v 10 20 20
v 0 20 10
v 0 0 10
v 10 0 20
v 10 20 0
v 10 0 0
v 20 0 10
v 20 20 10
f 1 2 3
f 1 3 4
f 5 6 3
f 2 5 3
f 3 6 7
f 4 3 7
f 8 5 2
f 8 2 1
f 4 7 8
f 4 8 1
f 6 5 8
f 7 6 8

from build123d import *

# Parameters (mm, degrees)
SKETCH1_W           = 20
SKETCH1_H           = 20
BOSS_EXTRUDE1_DEPTH = 20
CUT_EXTRUDE1_DEPTH  = 20
CUT_EXTRUDE2_DEPTH  = 20
CUT_EXTRUDE3_DEPTH  = 20
CUT_EXTRUDE4_DEPTH  = 20


with BuildPart() as part:
    # Sketch1 → Boss-Extrude1 (new body)
    with BuildSketch(Plane.XY):
        with Locations((10, 10)):
            Rectangle(SKETCH1_W, SKETCH1_H)
    extrude(amount=BOSS_EXTRUDE1_DEPTH)

    # Sketch2 → Cut-Extrude1 (cut)
    with BuildSketch(Plane(origin=(0, 20, 0), x_dir=(1, 0, 0), z_dir=(0, 1, 0))):
        Polygon((20, 0), (10, 0), (20, -10), align=None)
    extrude(amount=-CUT_EXTRUDE1_DEPTH, mode=Mode.SUBTRACT)

    # Sketch3 → Cut-Extrude2 (cut)
    with BuildSketch(Plane(origin=(0, 20, 0), x_dir=(1, 0, 0), z_dir=(0, 1, 0))):
        Polygon((20, -20), (20, -10), (10, -20), align=None)
    extrude(amount=-CUT_EXTRUDE2_DEPTH, mode=Mode.SUBTRACT)

    # Sketch4 → Cut-Extrude3 (cut)
    with BuildSketch(Plane(origin=(0, 20, 0), x_dir=(1, 0, 0), z_dir=(0, 1, 0))):
        Polygon((0, 0), (10, 0), (0, -10), align=None)
    extrude(amount=-CUT_EXTRUDE3_DEPTH, mode=Mode.SUBTRACT)

    # Sketch5 → Cut-Extrude4 (cut)
    with BuildSketch(Plane(origin=(0, 20, 0), x_dir=(1, 0, 0), z_dir=(0, 1, 0))):
        Polygon((0, -20), (0, -10), (10, -20), align=None)
    extrude(amount=-CUT_EXTRUDE4_DEPTH, mode=Mode.SUBTRACT)


solid = part.part
